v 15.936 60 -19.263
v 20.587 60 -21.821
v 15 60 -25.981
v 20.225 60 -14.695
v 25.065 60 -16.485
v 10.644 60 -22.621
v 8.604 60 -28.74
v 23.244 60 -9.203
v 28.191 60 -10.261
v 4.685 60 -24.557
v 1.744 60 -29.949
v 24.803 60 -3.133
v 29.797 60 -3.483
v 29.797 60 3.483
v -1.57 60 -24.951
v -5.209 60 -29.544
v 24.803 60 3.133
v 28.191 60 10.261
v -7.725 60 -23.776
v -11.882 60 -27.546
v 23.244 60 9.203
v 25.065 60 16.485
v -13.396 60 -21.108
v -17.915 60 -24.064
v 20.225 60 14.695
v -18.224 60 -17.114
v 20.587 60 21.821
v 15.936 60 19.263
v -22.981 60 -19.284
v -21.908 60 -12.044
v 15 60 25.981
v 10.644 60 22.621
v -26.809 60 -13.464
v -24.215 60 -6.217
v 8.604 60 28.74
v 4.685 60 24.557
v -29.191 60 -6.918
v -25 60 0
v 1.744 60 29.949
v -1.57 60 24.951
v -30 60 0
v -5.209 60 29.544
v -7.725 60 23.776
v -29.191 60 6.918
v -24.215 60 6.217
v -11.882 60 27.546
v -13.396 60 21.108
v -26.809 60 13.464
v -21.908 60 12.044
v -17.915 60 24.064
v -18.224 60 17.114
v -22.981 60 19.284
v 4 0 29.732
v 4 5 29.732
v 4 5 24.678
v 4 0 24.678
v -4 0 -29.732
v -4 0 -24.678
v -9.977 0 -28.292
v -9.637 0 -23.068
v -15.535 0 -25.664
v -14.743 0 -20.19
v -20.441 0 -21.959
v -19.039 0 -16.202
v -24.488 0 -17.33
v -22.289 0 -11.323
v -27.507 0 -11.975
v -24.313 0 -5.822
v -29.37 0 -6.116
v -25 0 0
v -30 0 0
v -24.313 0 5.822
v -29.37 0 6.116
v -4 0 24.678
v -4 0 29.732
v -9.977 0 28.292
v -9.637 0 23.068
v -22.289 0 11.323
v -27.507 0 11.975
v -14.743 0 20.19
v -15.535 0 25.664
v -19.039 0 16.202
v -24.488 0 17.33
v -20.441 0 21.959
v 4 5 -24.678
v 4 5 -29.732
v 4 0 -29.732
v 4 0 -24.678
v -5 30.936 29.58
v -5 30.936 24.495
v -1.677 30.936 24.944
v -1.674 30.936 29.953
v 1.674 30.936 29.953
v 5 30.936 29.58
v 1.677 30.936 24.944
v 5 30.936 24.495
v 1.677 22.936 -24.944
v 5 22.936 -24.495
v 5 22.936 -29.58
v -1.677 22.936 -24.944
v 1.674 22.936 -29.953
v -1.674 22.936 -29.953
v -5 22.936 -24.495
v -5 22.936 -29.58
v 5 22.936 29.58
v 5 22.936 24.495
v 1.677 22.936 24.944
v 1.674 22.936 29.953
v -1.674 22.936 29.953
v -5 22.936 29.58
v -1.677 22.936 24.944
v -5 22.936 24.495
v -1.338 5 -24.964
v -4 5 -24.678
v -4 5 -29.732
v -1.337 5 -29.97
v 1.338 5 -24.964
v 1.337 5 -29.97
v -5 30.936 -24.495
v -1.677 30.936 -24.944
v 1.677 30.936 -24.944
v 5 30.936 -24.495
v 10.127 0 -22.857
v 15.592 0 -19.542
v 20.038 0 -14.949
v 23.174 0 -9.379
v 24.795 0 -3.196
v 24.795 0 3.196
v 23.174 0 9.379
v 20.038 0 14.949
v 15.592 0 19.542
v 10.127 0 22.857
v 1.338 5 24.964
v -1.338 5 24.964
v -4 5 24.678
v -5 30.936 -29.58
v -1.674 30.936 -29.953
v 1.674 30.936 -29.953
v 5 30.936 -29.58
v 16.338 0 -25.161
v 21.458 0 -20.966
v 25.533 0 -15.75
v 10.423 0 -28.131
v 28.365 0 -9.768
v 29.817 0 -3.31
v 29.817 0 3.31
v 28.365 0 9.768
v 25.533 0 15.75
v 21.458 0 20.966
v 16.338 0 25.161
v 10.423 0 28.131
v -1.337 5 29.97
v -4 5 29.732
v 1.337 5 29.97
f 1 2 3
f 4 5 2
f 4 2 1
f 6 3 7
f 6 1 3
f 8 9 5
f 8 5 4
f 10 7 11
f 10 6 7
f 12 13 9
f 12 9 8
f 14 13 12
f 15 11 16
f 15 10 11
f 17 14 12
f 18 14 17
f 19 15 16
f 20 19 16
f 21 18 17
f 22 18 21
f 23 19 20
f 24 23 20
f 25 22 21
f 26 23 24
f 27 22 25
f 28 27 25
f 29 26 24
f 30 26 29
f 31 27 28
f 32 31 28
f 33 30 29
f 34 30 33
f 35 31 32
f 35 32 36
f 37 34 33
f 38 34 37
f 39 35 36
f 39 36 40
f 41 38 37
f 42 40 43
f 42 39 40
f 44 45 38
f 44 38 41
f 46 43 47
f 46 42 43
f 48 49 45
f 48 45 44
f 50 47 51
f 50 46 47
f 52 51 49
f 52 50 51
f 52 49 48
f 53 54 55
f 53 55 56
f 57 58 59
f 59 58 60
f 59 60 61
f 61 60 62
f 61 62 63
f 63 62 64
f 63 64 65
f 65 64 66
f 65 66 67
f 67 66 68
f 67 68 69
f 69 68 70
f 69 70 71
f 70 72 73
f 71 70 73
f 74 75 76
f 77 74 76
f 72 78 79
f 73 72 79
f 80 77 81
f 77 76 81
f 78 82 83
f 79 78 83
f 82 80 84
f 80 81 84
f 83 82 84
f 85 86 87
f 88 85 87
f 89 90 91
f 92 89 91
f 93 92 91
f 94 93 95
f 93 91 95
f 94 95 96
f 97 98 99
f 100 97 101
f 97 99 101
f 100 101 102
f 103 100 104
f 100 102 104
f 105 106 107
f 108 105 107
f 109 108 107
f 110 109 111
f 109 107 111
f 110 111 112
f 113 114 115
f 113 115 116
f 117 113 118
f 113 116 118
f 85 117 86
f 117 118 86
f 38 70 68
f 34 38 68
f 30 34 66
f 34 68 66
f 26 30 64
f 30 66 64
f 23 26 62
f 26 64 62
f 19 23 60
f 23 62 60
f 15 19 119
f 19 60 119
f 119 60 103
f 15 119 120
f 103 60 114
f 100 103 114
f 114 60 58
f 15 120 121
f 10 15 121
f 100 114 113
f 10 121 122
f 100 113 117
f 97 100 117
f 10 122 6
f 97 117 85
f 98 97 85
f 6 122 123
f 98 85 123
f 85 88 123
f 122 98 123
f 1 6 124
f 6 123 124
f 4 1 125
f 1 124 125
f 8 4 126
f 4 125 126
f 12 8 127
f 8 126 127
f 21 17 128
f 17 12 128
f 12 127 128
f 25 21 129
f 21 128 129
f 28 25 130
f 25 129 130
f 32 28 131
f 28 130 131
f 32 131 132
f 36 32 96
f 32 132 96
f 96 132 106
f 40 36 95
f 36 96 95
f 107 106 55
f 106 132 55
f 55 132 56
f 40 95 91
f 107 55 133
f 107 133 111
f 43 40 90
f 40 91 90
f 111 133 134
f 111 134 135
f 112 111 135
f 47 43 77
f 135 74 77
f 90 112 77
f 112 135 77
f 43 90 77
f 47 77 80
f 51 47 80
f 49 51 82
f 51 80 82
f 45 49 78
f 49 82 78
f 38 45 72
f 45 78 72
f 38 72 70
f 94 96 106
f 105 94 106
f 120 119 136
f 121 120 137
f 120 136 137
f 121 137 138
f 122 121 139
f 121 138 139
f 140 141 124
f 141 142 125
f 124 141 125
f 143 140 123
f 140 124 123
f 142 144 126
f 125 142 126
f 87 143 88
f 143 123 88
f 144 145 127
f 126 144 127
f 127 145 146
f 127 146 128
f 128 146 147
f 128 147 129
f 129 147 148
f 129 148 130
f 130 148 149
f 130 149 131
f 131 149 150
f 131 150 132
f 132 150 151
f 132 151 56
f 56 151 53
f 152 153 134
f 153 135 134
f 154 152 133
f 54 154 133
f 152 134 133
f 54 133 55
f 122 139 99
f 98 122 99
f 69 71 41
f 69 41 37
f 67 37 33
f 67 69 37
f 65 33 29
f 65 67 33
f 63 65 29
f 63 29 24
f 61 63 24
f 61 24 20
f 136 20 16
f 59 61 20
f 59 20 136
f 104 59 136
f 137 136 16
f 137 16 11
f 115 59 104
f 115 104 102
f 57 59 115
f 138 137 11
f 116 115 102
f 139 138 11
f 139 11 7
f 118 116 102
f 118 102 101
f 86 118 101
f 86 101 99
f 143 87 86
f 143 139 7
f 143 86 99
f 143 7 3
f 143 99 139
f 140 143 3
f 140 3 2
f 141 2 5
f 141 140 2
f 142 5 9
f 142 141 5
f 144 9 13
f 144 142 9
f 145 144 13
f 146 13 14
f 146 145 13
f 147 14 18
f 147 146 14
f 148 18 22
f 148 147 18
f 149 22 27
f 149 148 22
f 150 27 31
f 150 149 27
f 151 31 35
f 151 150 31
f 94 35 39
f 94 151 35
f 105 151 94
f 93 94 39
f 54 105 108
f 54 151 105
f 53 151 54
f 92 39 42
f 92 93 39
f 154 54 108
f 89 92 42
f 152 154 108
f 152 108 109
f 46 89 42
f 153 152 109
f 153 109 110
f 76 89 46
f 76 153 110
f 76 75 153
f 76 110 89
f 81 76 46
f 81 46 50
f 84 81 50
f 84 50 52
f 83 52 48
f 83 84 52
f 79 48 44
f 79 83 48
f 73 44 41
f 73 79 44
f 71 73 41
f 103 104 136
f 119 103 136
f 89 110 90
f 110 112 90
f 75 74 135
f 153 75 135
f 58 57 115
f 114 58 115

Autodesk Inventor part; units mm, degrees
ref_plane "YZ Plane" through (0, 0, 0) normal (1, 0, 0) x (0, 1, 0)
ref_plane "XZ Plane" through (0, 0, 0) normal (0, 1, 0) x (-1, 0, 0)
ref_plane "XY Plane" through (0, 0, 0) normal (0, 0, 1) x (1, 0, 0)
sketch "スケッチ1" plane through (0, 0, 0) normal (0, 1, 0) x (-1, 0, 0)
  circle A0 centre (0, 0) radius 25
  circle A1 centre (0, 0) radius 30
  dimension "d0" = 50
  dimension "d1" = 60
extrude "押し出し1" add sketch "スケッチ1" along normal blind 60
sketch "スケッチ2" plane through (0, 0, 0) normal (0, 0, 1) x (1, 0, 0)
  line L0 (-5, 30.9364) -> (5, 30.9364)
  line L1 (5, 30.9364) -> (5, 22.9364)
  line L2 (5, 22.9364) -> (-5, 22.9364)
  line L3 (-5, 22.9364) -> (-5, 30.9364)
  line L4 (-5, 30.9364) -> (5, 22.9364) construction
  line L5 (5, 30.9364) -> (-5, 22.9364) construction
  point P0 (0, 0)
  point P1 (0, 26.9364)
  dimension "d4" = 10
  dimension "d5" = 8
extrude "押し出し2" cut sketch "スケッチ2" along normal mid plane 60
sketch "スケッチ3" plane through (0, 0, 0) normal (0, 0, 1) x (1, 0, 0)
  point P0 (0, 0)
sketch "スケッチ4" plane through (0, 0, 0) normal (0, 0, 1) x (1, 0, 0)
  line L0 (4, -5) -> (-4, -5)
  line L1 (-4, -5) -> (-4, 5)
  line L2 (-4, 5) -> (4, 5)
  line L3 (4, 5) -> (4, -5)
  line L4 (4, -5) -> (-4, 5) construction
  line L5 (-4, -5) -> (4, 5) construction
  point P0 (0, 0)
  dimension "d8" = 8
  dimension "d9" = 10
extrude "押し出し3" cut sketch "スケッチ4" along normal mid plane 60
properties part number "pipe"
